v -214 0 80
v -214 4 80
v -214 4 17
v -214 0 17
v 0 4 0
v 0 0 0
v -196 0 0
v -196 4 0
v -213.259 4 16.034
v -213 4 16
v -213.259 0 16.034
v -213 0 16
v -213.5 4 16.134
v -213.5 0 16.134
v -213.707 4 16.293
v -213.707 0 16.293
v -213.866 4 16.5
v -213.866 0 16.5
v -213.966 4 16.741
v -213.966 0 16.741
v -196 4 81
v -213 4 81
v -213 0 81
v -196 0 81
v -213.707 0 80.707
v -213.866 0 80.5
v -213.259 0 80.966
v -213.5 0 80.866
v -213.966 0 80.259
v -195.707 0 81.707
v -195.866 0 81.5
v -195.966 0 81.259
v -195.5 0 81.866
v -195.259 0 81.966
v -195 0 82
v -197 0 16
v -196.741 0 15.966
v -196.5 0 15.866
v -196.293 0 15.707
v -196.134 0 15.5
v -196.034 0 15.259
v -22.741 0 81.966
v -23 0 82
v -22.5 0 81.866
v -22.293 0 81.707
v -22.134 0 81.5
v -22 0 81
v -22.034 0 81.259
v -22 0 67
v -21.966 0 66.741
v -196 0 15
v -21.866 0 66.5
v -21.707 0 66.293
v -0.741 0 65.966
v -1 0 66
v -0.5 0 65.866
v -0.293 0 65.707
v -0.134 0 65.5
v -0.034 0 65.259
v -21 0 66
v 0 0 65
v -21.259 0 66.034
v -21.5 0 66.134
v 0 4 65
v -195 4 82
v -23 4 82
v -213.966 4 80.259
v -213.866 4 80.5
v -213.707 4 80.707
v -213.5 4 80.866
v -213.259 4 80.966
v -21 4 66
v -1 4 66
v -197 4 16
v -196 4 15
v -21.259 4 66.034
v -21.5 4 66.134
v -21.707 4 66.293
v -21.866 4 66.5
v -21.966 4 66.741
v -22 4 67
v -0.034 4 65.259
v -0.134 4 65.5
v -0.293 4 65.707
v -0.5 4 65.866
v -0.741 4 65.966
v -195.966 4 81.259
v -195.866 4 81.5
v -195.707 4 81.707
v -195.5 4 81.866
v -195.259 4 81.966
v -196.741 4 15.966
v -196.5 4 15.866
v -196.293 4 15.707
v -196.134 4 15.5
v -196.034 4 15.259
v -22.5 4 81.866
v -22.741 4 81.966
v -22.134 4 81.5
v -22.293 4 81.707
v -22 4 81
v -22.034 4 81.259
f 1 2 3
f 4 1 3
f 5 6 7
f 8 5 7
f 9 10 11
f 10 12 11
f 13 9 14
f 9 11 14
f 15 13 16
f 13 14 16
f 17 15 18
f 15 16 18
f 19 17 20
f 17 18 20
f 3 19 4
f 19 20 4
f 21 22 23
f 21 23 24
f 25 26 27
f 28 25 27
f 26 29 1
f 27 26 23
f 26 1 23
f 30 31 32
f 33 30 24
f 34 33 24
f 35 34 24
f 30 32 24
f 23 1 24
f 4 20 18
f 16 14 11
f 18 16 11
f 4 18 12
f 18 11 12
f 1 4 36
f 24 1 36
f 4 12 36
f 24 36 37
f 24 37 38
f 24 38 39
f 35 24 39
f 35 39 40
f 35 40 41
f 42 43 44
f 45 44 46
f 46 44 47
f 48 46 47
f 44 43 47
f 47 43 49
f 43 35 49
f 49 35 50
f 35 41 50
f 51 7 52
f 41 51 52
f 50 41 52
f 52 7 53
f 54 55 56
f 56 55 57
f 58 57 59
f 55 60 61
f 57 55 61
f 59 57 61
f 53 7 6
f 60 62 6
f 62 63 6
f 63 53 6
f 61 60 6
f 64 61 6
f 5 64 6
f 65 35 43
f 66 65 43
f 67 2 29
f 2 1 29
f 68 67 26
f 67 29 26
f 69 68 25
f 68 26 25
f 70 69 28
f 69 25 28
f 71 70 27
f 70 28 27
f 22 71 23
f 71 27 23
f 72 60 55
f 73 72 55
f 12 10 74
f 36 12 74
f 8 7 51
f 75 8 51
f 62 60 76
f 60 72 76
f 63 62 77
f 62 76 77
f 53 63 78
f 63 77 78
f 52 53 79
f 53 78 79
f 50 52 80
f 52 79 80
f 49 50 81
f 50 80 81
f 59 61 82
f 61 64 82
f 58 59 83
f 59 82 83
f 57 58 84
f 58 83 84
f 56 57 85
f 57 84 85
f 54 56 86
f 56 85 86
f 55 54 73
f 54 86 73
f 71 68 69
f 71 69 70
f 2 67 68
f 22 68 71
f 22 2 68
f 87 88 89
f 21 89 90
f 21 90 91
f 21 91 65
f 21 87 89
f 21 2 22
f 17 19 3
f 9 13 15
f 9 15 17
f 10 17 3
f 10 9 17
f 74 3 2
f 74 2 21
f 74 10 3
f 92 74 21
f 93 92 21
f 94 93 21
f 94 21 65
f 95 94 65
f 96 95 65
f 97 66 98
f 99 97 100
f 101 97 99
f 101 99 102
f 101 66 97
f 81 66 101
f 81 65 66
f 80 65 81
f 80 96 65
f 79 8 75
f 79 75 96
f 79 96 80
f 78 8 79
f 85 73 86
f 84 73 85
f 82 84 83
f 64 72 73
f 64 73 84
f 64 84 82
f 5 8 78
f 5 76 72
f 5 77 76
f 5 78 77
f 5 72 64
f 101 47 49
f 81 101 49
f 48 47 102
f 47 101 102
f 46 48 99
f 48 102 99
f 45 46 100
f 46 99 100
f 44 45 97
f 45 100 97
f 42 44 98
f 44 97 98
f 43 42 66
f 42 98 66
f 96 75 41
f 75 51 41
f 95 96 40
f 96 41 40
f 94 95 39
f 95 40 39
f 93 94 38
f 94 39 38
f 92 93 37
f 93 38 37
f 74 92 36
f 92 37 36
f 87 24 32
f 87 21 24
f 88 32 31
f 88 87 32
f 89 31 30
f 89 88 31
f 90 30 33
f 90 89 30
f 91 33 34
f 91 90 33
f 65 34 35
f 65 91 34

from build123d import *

# Parameters (mm, degrees)
EXTRUDE_1_DEPTH = 4
SKETCH_2_W      = 18
SKETCH_2_H      = 65
EXTRUDE_2_DEPTH = 4
FILLET_1_R      = 1


with BuildPart() as part:
    # 草图1 → 凸台-拉伸1 (new body)
    with BuildSketch(Plane(origin=(0, 0, 0), x_dir=(1, 0, 0), z_dir=(0, 1, 0))):
        Polygon((0, -66), (0, 0), (-196, 0), (-196, -82), (-22, -82), (-22, -66), align=None)
    extrude(amount=EXTRUDE_1_DEPTH)

    # 草图2 → 凸台-拉伸2 (add)
    with BuildSketch(Plane(origin=(0, 4, 0), x_dir=(1, 0, 0), z_dir=(0, 1, 0))):
        with Locations((-205, -48.5)):
            Rectangle(SKETCH_2_W, SKETCH_2_H)
    extrude(amount=-EXTRUDE_2_DEPTH)

    # 圆角1
    fillet_1_edges = [part.edges().sort_by_distance(p)[0] for p in [
        (-22, 2, 82),
        (-196, 2, 82),
        (0, 2, 66),
        (-22, 2, 66),
        (-196, 2, 16),
        (-214, 2, 81),
        (-214, 2, 16),
    ]]
    fillet(fillet_1_edges, radius=FILLET_1_R - 0.0001)  # a hair under: the kernel refuses the full size


solid = part.part
